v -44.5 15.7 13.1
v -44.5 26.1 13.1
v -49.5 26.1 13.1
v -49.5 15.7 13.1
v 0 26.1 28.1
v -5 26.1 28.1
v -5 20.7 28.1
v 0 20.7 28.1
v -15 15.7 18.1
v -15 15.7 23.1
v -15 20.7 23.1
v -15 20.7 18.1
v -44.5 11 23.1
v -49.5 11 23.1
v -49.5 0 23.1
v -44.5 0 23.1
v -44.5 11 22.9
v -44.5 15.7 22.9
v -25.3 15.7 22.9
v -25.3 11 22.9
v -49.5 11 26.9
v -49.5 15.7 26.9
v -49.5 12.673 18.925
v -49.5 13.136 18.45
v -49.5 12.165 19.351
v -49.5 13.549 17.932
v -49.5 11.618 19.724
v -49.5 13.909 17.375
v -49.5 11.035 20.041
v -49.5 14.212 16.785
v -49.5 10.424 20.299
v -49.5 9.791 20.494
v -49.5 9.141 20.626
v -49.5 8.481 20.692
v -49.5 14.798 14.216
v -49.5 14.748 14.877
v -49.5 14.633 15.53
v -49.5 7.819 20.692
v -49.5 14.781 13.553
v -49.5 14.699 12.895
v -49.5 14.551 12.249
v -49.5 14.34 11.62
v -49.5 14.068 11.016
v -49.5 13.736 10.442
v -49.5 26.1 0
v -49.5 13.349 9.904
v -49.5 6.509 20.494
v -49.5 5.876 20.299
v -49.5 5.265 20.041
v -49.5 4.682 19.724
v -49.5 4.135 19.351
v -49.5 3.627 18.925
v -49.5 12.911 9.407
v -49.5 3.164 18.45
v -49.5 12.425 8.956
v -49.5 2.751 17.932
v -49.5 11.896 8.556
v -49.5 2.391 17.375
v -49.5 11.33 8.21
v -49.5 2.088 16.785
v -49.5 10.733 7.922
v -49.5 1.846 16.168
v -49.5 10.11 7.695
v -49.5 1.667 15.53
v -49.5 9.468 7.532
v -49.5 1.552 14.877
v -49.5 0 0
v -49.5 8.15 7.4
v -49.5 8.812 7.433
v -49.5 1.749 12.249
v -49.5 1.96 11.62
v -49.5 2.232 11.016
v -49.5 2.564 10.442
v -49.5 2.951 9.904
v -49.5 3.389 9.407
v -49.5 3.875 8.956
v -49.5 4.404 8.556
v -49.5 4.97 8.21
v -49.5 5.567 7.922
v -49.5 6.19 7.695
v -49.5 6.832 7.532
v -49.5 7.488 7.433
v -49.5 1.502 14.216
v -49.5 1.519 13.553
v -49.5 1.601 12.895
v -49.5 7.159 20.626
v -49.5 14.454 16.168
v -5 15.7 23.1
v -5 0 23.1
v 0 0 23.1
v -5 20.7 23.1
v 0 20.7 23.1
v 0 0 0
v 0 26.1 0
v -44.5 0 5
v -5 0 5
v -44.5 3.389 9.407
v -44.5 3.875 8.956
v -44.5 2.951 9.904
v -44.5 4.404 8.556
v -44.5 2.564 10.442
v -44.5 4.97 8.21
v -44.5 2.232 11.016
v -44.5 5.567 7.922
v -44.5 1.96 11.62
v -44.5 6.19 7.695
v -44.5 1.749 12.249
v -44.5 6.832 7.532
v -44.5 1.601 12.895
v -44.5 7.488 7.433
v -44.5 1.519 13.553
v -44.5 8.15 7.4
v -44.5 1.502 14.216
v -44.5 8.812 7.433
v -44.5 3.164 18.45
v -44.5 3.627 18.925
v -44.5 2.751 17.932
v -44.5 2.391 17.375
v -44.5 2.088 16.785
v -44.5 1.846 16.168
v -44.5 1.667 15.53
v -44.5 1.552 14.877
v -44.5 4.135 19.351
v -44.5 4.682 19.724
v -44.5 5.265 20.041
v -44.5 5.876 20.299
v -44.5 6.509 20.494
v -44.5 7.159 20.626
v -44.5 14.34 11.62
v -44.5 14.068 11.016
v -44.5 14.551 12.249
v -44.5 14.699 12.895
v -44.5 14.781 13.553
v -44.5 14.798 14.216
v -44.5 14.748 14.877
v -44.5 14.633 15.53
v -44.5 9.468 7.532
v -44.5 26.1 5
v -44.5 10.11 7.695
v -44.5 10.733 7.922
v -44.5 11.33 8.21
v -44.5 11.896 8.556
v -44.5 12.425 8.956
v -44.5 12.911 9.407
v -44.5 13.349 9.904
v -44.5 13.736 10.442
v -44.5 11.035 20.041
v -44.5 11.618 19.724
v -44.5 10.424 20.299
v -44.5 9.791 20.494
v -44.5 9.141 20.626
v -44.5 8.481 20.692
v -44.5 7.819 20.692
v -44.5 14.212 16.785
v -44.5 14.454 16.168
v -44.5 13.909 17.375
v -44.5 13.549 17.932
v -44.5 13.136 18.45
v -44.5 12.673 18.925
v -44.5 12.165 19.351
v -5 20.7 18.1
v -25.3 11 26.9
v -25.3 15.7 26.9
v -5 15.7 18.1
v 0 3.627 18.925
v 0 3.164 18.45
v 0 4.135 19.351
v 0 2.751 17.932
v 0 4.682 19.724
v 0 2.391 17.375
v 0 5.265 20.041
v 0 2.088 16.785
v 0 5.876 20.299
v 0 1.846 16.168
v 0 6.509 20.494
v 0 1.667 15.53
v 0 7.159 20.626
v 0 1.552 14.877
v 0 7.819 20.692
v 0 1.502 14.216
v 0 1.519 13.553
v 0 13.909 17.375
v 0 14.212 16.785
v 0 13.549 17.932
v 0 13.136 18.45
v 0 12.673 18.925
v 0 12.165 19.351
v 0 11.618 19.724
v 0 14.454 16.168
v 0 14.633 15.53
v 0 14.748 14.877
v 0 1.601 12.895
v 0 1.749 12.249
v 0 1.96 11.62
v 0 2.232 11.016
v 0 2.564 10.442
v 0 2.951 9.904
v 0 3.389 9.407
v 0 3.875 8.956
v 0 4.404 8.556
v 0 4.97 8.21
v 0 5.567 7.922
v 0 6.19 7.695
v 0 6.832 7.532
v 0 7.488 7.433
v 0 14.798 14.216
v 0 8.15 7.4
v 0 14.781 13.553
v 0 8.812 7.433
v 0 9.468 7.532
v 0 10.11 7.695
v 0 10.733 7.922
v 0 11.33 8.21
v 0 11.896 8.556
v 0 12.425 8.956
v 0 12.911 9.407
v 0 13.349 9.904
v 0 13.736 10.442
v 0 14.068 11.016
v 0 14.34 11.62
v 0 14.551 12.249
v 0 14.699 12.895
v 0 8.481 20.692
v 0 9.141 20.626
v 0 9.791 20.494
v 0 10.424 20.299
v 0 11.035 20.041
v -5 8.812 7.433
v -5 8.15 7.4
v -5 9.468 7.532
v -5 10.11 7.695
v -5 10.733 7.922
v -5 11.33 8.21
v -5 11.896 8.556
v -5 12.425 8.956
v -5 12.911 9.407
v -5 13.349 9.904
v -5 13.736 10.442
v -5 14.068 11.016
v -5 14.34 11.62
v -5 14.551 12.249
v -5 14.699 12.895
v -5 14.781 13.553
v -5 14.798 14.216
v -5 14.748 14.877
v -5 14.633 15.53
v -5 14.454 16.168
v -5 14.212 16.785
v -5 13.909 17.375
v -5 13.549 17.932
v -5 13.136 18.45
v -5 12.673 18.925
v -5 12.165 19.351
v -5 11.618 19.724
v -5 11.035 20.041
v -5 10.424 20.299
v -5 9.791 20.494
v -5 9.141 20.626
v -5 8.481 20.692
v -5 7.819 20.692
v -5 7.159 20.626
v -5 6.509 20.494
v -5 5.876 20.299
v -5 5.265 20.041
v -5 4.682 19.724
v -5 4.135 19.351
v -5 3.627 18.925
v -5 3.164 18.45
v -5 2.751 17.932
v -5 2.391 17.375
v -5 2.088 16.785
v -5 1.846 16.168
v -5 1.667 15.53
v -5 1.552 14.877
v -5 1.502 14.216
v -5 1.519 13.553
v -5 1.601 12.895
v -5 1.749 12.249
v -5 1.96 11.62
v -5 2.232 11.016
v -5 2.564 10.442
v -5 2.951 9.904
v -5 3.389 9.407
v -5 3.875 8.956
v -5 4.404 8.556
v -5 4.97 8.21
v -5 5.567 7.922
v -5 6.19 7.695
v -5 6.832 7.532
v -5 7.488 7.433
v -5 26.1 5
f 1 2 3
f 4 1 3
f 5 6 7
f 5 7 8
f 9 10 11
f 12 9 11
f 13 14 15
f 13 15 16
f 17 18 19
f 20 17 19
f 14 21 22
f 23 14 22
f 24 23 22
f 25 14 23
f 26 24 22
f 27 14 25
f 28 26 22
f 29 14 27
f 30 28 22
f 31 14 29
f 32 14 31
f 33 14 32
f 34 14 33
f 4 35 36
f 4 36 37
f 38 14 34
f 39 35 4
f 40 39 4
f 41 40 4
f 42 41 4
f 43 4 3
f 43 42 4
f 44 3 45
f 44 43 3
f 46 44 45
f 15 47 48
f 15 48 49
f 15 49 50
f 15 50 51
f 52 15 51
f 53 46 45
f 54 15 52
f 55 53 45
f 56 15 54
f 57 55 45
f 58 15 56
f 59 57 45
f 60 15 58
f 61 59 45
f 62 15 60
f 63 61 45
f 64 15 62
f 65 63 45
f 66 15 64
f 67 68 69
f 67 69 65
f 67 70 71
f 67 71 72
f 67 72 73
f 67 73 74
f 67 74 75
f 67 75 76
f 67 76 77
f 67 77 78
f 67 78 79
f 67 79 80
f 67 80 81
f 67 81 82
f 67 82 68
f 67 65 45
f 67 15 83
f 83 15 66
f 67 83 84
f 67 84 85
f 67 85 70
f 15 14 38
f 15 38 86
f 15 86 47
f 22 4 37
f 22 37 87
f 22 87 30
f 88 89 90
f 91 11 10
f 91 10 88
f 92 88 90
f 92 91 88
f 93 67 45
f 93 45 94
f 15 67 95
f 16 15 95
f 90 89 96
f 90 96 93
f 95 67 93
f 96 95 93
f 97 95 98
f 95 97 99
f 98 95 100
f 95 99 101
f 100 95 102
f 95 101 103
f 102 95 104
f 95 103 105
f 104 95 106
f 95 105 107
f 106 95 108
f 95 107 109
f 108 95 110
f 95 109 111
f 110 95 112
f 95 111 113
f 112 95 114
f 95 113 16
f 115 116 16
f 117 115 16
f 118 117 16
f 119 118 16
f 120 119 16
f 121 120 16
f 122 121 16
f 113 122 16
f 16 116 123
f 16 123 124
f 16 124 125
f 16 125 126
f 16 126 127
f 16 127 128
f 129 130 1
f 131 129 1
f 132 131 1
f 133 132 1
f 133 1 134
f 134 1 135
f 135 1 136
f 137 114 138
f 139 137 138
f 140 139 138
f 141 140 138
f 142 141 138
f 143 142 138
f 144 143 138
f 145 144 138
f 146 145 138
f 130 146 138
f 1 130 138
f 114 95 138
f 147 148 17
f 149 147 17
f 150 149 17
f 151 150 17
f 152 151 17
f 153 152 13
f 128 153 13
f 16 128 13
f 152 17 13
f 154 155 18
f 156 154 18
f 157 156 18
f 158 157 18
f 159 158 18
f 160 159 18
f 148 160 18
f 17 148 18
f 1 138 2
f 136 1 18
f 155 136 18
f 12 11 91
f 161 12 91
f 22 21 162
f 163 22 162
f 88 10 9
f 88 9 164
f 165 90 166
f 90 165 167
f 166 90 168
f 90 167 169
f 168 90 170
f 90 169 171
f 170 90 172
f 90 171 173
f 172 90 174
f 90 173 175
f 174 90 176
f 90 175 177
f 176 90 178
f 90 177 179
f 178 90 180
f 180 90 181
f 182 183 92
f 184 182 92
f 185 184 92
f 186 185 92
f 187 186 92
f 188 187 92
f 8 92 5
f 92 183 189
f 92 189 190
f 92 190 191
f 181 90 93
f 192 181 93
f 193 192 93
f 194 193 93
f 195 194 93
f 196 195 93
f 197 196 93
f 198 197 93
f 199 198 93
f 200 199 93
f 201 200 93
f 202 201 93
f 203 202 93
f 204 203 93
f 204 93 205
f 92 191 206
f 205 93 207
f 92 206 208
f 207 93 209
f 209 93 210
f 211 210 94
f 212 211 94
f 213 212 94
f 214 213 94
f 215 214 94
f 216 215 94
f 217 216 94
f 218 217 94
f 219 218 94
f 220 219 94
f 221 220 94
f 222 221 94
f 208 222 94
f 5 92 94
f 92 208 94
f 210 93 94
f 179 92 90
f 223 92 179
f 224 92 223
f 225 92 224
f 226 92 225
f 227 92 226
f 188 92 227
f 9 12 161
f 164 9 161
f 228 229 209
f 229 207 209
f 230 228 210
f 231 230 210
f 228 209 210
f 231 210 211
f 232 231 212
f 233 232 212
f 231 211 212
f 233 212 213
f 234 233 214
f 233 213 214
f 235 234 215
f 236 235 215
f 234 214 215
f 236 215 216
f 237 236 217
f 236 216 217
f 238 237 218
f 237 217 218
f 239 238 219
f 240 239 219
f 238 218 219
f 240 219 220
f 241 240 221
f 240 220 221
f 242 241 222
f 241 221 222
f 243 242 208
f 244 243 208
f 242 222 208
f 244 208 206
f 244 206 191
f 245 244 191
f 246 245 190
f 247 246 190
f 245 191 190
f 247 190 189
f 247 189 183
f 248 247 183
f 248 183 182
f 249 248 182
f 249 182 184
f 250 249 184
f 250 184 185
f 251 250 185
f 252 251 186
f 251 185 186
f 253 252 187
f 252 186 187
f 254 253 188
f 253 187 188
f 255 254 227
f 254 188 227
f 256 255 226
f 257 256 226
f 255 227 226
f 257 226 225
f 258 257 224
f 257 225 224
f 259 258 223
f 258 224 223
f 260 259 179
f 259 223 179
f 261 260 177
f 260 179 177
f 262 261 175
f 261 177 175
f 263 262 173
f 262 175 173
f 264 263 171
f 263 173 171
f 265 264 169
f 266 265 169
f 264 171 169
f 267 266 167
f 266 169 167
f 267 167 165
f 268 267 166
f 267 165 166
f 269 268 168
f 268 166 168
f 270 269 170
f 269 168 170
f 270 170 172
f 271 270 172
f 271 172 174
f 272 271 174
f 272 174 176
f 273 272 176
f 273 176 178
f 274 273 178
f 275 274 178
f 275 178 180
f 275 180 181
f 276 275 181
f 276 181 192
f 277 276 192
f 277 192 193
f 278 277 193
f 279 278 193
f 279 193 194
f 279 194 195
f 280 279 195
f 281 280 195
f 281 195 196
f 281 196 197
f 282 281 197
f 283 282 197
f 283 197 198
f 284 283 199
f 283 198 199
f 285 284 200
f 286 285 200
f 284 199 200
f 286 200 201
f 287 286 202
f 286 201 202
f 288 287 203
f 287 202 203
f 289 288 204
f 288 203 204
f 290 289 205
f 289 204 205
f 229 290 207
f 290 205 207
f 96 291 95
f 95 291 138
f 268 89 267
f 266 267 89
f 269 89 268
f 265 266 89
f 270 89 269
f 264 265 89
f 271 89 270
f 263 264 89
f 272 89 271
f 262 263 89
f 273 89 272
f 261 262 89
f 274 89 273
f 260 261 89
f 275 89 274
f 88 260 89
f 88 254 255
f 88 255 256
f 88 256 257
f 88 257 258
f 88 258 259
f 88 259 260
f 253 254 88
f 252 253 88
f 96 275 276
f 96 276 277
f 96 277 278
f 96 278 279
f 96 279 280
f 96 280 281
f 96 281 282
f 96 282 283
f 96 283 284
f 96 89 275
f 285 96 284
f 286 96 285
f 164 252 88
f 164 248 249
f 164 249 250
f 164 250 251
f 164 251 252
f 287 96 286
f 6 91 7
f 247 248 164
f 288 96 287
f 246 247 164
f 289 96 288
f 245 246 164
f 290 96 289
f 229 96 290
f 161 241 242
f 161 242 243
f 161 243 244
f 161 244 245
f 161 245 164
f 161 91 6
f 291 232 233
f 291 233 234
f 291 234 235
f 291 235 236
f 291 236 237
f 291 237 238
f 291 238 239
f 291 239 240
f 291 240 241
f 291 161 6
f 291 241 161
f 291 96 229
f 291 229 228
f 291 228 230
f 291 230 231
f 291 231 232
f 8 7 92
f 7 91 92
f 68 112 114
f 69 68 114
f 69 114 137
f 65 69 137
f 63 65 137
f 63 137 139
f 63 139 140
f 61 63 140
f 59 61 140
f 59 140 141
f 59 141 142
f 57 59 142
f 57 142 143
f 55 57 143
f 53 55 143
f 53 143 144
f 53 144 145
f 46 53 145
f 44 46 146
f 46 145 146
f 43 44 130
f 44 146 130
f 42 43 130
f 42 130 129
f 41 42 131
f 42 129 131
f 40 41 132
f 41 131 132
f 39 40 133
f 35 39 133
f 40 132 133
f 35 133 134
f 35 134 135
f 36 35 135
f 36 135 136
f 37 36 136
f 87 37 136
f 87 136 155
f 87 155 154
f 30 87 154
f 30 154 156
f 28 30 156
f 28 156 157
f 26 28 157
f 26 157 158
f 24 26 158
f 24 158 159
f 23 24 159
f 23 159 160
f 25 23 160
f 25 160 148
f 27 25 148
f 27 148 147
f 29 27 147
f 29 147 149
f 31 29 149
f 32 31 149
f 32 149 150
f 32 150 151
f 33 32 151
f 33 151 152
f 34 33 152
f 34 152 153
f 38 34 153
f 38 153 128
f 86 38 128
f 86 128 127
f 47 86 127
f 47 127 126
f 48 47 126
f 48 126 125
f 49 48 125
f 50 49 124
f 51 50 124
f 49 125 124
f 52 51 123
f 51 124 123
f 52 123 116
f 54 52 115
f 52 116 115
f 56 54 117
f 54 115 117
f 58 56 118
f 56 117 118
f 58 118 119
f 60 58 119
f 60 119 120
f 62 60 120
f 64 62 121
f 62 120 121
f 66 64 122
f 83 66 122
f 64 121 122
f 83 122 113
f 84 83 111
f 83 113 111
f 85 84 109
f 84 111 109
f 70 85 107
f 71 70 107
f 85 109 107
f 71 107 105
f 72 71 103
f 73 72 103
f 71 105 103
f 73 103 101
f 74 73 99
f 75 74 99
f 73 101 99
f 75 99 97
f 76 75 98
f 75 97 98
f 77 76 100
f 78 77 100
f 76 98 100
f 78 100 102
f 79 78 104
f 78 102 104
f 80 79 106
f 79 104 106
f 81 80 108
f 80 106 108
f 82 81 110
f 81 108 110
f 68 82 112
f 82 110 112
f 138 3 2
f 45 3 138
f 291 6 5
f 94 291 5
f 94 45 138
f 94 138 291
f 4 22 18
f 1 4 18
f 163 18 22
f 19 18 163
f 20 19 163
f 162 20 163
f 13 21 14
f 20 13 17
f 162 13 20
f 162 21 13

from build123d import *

# Parameters (mm, degrees)
CROQUIS2_W              = 49.5
CROQUIS2_H              = 26.9
SALIENTE_EXTRUIR1_DEPTH = 26.1
CORTAR_EXTRUIR2_DEPTH   = 26.1
CORTAR_EXTRUIR4_REACH   = 60.181
CROQUIS9_R              = 6.65
CORTAR_EXTRUIR5_REACH   = 64.089
CROQUIS8_R              = 6.65
CORTAR_EXTRUIR6_DEPTH   = 10.4
CROQUIS10_W             = 24.2
CROQUIS10_H             = 11
CORTAR_EXTRUIR7_DEPTH   = 3.8
CROQUIS13_W             = 19.2
CROQUIS13_H             = 11
CORTAR_EXTRUIR8_DEPTH   = 0.2
CORTAR_EXTRUIR9_REACH   = 64.089
CROQUIS14_W             = 3.8
CROQUIS14_H             = 20.7
CROQUIS15_W             = 10
CROQUIS15_H             = 5
SALIENTE_EXTRUIR2_DEPTH = 5
CROQUIS16_W             = 5
CROQUIS16_H             = 5.4
SALIENTE_EXTRUIR3_DEPTH = 1.2


with BuildPart() as part:
    # Croquis2 → Saliente-Extruir1 (new body)
    with BuildSketch(Plane(origin=(0, 0, 0), x_dir=(1, 0, 0), z_dir=(0, 1, 0))):
        with Locations((-24.75, -13.45)):
            Rectangle(CROQUIS2_W, CROQUIS2_H)
    extrude(amount=SALIENTE_EXTRUIR1_DEPTH)

    # Croquis6 → Cortar-Extruir2 (cut)
    with BuildSketch(Plane(origin=(0, 26.1, 0), x_dir=(1, 0, 0), z_dir=(0, 1, 0))):
        Polygon((-44.5, -21.9), (-44.5, -22.9), (-25.3, -22.9), (-25.3, -26.9), (-5, -26.9), (-5, -21.9), (-5, -5), (-44.5, -5), align=None)
    extrude(amount=-CORTAR_EXTRUIR2_DEPTH, mode=Mode.SUBTRACT)

    # Croquis9 → Cortar-Extruir4 (cut, up to next)
    with BuildSketch(Plane(origin=(-44.5, 0, 0), x_dir=(0, 0, -1), z_dir=(1, 0, 0)), mode=Mode.PRIVATE) as cortar_extruir4_sk1:
        with Locations((-14.05, 8.15)):
            Circle(CROQUIS9_R)
    cortar_extruir4_tool1 = extrude(cortar_extruir4_sk1.sketch, amount=-CORTAR_EXTRUIR4_REACH, mode=Mode.PRIVATE) & part.part
    add(cortar_extruir4_tool1.solids().sort_by_distance((-44.5, 8.15, 14.05))[0], mode=Mode.SUBTRACT)

    # Croquis8 → Cortar-Extruir5 (cut, up to next)
    with BuildSketch(Plane(origin=(0, 0, 0), x_dir=(0, 0, -1), z_dir=(1, 0, 0)), mode=Mode.PRIVATE) as cortar_extruir5_sk1:
        with Locations((-14.05, 8.15)):
            Circle(CROQUIS8_R)
    cortar_extruir5_tool1 = extrude(cortar_extruir5_sk1.sketch, amount=-CORTAR_EXTRUIR5_REACH, mode=Mode.PRIVATE) & part.part
    add(cortar_extruir5_tool1.solids().sort_by_distance((0, 8.15, 14.05))[0], mode=Mode.SUBTRACT)

    # Croquis11 → Cortar-Extruir6 (cut)
    with BuildSketch(Plane(origin=(0, 26.1, 0), x_dir=(1, 0, 0), z_dir=(0, 1, 0))):
        Polygon((-44.5, -13.1), (-49.5, -13.1), (-49.5, -26.9), (-25.3, -26.9), (-25.3, -22.9), (-44.5, -22.9), align=None)
    extrude(amount=-CORTAR_EXTRUIR6_DEPTH, mode=Mode.SUBTRACT)

    # Croquis10 → Cortar-Extruir7 (cut)
    with BuildSketch(Plane.XY.offset(26.9)):
        with Locations((-37.4, 5.5)):
            Rectangle(CROQUIS10_W, CROQUIS10_H)
    extrude(amount=-CORTAR_EXTRUIR7_DEPTH, mode=Mode.SUBTRACT)

    # Croquis13 → Cortar-Extruir8 (cut)
    with BuildSketch(Plane(origin=(0, 0, 22.9), x_dir=(-1, 0, 0), z_dir=(0, 0, -1))):
        with Locations((34.9, 5.5)):
            Rectangle(CROQUIS13_W, CROQUIS13_H)
    extrude(amount=-CORTAR_EXTRUIR8_DEPTH, mode=Mode.SUBTRACT)

    # Croquis14 → Cortar-Extruir9 (cut, up to next)
    with BuildSketch(Plane(origin=(0, 0, 0), x_dir=(0, 0, -1), z_dir=(1, 0, 0)), mode=Mode.PRIVATE) as cortar_extruir9_sk1:
        with Locations((-25, 10.35)):
            Rectangle(CROQUIS14_W, CROQUIS14_H)
    cortar_extruir9_tool1 = extrude(cortar_extruir9_sk1.sketch, amount=-CORTAR_EXTRUIR9_REACH, mode=Mode.PRIVATE) & part.part
    add(cortar_extruir9_tool1.solids().sort_by_distance((0, 10.35, 25))[0], mode=Mode.SUBTRACT)

    # Croquis15 → Saliente-Extruir2 (add)
    with BuildSketch(Plane.XY.offset(23.1)):
        with Locations((-10, 18.2)):
            Rectangle(CROQUIS15_W, CROQUIS15_H)
    extrude(amount=-SALIENTE_EXTRUIR2_DEPTH)

    # Croquis16 → Saliente-Extruir3 (add)
    with BuildSketch(Plane.XY.offset(26.9)):
        with Locations((-2.5, 23.4)):
            Rectangle(CROQUIS16_W, CROQUIS16_H)
    extrude(amount=SALIENTE_EXTRUIR3_DEPTH)


solid = part.part
